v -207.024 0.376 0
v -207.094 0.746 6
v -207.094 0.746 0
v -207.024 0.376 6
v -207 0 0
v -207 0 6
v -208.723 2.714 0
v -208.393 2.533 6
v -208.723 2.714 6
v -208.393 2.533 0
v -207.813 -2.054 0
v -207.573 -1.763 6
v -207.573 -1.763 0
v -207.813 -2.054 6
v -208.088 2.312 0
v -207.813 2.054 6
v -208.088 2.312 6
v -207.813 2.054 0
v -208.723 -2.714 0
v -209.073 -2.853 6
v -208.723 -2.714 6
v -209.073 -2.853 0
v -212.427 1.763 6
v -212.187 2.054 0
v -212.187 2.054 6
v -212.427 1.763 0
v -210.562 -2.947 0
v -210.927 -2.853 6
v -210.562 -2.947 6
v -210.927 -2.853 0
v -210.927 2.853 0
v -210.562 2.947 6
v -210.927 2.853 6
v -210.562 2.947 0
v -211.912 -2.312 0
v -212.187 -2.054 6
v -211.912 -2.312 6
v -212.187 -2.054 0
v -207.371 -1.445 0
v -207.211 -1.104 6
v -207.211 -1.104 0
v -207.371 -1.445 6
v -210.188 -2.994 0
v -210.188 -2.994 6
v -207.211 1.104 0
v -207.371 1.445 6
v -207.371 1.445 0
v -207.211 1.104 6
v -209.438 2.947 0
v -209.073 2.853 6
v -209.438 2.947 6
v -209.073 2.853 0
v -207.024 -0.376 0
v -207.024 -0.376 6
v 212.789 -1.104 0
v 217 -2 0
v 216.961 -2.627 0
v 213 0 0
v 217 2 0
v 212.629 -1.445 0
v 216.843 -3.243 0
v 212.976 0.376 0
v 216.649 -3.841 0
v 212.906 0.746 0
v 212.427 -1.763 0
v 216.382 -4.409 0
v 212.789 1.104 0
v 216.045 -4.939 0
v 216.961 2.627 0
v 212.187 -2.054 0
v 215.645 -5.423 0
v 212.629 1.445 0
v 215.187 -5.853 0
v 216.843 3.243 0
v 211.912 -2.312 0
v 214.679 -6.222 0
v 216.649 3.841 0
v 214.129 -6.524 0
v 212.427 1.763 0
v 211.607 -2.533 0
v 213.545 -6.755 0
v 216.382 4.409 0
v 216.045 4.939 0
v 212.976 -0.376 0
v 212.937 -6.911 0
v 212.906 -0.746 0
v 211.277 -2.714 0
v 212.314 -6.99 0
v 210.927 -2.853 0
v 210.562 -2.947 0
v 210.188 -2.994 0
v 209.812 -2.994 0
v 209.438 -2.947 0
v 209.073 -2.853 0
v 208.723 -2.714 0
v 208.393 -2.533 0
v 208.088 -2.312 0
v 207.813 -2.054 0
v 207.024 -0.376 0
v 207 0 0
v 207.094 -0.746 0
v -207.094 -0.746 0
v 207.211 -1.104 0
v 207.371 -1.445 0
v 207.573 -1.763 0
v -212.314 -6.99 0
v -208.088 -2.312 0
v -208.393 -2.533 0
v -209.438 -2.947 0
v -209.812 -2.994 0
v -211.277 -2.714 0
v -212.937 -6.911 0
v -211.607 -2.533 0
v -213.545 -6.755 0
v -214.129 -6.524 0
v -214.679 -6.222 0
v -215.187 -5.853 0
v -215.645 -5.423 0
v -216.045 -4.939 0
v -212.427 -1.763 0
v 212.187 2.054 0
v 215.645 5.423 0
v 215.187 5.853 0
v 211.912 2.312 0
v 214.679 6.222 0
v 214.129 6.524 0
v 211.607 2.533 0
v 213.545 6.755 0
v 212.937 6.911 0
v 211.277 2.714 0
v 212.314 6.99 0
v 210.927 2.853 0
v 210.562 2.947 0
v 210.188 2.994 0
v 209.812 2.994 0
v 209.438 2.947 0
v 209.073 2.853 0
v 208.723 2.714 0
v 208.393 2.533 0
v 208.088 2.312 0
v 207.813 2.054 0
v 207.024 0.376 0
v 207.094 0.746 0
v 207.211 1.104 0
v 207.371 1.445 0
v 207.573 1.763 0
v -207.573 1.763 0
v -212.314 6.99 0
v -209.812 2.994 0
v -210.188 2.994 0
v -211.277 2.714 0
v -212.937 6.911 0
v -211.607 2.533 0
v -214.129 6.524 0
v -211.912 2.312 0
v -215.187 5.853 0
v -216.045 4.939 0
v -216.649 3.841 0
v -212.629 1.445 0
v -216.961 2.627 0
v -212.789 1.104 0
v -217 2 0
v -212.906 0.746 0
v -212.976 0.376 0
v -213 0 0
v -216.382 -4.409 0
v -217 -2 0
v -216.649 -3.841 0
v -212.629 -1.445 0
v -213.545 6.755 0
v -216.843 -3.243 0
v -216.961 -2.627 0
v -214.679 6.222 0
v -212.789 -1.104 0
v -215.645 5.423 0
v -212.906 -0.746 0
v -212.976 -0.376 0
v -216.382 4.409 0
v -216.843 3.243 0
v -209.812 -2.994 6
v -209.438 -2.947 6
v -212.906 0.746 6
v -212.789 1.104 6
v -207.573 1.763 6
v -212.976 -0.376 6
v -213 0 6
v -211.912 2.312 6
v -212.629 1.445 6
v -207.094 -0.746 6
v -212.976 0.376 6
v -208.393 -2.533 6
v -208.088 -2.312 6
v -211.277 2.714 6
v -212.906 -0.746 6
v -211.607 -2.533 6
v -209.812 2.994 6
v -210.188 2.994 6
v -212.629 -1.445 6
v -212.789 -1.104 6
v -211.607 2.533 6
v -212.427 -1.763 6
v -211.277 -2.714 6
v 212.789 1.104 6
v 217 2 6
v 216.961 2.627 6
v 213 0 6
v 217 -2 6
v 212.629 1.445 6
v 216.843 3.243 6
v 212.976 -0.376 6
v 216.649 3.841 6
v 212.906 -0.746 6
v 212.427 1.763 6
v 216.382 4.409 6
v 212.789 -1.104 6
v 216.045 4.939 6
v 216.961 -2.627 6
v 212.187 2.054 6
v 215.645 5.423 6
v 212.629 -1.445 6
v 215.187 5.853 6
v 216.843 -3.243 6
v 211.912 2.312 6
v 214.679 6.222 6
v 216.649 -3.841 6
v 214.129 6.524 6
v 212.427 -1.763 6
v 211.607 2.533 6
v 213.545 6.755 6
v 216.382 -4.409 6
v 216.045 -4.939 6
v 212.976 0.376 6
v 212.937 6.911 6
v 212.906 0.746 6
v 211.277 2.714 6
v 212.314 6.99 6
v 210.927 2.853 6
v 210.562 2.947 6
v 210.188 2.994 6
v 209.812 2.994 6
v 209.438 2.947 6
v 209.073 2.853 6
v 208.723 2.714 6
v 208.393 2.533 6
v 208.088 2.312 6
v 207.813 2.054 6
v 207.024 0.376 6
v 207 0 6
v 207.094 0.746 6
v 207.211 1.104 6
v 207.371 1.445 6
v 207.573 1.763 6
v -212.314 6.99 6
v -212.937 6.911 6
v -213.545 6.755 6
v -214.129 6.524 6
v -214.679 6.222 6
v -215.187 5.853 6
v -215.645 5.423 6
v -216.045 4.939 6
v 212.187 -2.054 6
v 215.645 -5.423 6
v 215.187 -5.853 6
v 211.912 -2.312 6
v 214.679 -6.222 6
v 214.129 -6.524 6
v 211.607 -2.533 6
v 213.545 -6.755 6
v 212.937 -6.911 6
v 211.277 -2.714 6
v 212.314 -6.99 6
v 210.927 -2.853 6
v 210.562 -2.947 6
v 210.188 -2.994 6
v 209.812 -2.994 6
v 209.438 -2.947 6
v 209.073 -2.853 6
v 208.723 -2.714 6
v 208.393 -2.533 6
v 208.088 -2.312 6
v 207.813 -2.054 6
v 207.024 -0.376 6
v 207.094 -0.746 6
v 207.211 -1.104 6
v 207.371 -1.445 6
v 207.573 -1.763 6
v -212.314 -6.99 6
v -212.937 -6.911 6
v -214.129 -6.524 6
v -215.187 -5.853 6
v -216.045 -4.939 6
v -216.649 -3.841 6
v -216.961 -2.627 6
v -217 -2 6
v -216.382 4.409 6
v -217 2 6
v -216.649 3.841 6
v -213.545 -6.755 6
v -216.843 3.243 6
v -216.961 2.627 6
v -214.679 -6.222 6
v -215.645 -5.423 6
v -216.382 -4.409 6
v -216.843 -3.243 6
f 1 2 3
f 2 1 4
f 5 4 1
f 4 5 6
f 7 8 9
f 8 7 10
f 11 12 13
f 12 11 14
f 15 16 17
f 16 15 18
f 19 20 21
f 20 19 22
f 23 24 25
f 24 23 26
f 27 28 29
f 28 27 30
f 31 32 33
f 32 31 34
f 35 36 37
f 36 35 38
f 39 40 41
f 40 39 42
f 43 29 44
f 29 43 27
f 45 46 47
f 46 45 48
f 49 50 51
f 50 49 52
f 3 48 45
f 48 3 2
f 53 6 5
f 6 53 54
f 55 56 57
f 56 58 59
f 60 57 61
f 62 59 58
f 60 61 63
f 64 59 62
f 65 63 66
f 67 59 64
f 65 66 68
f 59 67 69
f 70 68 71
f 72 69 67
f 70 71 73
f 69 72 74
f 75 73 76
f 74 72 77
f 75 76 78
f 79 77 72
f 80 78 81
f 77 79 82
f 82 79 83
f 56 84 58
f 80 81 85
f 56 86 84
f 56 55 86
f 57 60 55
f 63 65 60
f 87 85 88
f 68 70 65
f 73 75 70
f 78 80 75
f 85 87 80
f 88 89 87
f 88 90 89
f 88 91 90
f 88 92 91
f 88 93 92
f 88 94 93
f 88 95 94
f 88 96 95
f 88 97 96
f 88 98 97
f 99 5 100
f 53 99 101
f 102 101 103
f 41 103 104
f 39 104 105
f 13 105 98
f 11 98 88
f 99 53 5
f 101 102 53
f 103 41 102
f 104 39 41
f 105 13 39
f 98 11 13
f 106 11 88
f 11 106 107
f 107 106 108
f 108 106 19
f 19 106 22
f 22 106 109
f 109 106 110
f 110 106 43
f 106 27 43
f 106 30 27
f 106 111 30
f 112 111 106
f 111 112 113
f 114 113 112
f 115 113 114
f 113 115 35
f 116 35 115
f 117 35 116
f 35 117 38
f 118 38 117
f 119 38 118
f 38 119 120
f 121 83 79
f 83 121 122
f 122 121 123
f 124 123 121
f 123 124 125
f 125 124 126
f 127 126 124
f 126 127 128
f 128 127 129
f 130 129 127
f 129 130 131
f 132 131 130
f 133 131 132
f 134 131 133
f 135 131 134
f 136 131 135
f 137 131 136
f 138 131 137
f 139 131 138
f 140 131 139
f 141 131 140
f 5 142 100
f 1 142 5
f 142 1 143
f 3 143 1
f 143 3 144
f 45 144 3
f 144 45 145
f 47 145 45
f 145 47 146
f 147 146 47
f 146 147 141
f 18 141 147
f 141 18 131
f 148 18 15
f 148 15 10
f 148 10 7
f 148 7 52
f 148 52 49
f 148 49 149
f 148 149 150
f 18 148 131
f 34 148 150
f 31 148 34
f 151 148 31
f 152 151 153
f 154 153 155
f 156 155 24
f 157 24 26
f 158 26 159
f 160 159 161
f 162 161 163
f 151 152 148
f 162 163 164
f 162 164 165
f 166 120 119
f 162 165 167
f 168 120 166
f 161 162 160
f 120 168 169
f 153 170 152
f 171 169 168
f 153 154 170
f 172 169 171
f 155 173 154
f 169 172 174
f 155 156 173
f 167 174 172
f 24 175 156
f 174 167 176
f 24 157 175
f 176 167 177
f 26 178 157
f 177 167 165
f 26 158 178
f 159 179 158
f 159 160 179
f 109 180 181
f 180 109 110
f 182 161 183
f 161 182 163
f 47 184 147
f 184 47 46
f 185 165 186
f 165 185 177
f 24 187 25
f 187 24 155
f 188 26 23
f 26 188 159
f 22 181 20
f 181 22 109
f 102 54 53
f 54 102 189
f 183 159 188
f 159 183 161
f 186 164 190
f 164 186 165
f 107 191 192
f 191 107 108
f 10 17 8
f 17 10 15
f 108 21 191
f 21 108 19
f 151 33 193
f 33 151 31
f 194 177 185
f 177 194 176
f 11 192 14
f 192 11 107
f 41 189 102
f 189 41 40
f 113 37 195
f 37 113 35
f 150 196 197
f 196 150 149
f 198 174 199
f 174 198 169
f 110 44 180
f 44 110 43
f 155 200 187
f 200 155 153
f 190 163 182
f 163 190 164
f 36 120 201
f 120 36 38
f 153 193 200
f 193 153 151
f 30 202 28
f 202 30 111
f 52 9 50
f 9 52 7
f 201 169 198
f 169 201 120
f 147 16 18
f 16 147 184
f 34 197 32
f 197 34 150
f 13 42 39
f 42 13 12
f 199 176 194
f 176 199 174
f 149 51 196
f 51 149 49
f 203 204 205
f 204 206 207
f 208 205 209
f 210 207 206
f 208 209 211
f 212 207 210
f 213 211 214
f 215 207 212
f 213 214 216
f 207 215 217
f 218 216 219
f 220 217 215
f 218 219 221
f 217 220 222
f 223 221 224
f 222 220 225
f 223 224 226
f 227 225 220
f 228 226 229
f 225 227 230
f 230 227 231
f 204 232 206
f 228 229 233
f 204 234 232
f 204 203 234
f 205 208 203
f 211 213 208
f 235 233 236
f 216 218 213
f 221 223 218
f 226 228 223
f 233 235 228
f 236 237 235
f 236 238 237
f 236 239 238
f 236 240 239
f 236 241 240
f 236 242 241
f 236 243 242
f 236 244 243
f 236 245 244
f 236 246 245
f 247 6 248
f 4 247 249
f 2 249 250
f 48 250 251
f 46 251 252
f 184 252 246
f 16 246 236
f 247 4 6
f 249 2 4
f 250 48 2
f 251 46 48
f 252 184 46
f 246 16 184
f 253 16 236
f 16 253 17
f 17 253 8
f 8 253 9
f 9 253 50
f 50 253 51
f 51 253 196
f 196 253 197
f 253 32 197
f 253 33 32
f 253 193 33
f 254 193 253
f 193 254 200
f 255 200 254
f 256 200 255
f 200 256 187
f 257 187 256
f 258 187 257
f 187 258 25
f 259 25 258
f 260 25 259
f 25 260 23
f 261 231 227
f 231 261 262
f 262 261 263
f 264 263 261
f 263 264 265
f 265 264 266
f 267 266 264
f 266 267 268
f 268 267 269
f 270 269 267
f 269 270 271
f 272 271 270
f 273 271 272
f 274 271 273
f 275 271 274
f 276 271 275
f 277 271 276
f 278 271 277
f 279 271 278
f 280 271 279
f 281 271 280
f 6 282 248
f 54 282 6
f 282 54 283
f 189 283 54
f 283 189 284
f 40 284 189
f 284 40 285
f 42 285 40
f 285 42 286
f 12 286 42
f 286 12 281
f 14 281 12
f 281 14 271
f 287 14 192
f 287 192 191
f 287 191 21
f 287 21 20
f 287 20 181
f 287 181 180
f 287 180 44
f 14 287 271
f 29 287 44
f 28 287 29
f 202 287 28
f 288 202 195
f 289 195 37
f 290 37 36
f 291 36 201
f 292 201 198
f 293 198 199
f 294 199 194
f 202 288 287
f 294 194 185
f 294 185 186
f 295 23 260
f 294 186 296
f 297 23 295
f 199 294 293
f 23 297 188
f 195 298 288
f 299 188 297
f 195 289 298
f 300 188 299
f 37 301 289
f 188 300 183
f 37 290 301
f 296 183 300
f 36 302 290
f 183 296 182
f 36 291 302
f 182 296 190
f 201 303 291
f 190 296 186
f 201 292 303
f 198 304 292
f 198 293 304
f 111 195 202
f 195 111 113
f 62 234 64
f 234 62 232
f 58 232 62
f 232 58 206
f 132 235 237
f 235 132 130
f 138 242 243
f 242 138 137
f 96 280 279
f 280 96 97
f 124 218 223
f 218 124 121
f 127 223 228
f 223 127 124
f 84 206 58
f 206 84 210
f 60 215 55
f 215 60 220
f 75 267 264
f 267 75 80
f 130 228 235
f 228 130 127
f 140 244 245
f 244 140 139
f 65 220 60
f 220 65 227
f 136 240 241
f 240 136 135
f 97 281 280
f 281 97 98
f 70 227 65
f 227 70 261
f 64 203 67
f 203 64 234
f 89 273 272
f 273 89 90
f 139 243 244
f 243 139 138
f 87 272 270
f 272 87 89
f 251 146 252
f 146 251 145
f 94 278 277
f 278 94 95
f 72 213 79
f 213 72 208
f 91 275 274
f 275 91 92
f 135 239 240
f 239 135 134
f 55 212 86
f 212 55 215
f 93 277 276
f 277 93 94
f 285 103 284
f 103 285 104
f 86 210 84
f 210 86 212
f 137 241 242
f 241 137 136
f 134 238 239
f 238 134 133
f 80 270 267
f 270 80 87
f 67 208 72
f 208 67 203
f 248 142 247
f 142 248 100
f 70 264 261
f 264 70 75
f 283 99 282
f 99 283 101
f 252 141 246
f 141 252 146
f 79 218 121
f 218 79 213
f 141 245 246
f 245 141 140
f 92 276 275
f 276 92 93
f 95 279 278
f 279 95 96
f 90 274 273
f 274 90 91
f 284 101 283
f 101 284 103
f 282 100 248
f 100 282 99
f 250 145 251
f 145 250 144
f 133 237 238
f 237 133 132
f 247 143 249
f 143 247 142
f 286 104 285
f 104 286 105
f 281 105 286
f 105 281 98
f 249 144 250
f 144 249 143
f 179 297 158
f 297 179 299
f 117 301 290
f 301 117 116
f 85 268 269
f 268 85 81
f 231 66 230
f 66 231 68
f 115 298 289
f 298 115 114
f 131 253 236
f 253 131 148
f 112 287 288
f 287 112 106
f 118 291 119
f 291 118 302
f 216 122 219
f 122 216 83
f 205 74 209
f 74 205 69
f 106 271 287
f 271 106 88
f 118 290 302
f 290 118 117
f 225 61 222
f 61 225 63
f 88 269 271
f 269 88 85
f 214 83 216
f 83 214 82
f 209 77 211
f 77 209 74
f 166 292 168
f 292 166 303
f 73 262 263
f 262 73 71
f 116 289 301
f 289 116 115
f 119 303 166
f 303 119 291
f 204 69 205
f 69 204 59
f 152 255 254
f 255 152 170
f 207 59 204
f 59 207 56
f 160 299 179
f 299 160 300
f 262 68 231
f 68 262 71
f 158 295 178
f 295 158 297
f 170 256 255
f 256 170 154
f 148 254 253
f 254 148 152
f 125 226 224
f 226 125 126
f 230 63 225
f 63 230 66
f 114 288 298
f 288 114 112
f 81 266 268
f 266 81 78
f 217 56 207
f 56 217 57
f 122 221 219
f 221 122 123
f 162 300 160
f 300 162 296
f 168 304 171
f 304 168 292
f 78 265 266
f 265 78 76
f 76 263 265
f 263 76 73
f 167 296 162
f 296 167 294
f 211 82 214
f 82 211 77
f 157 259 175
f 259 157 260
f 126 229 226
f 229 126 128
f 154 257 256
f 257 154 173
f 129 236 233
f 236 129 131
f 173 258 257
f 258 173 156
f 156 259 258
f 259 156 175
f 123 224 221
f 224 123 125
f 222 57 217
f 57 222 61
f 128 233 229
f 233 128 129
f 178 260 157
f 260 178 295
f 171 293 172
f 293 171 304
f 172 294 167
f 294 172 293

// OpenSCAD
$fn = 50;


difference() {
	union() {
		hull() {
			translate(v = [-212.0000000000, 2.0000000000, 0]) {
				cylinder(h = 6, r = 5);
			}
			translate(v = [212.0000000000, 2.0000000000, 0]) {
				cylinder(h = 6, r = 5);
			}
			translate(v = [-212.0000000000, -2.0000000000, 0]) {
				cylinder(h = 6, r = 5);
			}
			translate(v = [212.0000000000, -2.0000000000, 0]) {
				cylinder(h = 6, r = 5);
			}
		}
	}
	union() {
		translate(v = [-210.0000000000, 0.0000000000, 0]) {
			cylinder(h = 6, r = 3.0000000000);
		}
		translate(v = [210.0000000000, 0.0000000000, 0]) {
			cylinder(h = 6, r = 3.0000000000);
		}
		translate(v = [-210.0000000000, 0.0000000000, 0]) {
			cylinder(h = 6, r = 1.5000000000);
		}
		translate(v = [210.0000000000, 0.0000000000, 0]) {
			cylinder(h = 6, r = 1.5000000000);
		}
		translate(v = [-210.0000000000, 0.0000000000, 0]) {
			cylinder(h = 6, r = 1.5000000000);
		}
		translate(v = [210.0000000000, 0.0000000000, 0]) {
			cylinder(h = 6, r = 1.5000000000);
		}
		translate(v = [-210.0000000000, 0.0000000000, 0]) {
			cylinder(h = 6, r = 1.5000000000);
		}
		translate(v = [210.0000000000, 0.0000000000, 0]) {
			cylinder(h = 6, r = 1.5000000000);
		}
	}
}
